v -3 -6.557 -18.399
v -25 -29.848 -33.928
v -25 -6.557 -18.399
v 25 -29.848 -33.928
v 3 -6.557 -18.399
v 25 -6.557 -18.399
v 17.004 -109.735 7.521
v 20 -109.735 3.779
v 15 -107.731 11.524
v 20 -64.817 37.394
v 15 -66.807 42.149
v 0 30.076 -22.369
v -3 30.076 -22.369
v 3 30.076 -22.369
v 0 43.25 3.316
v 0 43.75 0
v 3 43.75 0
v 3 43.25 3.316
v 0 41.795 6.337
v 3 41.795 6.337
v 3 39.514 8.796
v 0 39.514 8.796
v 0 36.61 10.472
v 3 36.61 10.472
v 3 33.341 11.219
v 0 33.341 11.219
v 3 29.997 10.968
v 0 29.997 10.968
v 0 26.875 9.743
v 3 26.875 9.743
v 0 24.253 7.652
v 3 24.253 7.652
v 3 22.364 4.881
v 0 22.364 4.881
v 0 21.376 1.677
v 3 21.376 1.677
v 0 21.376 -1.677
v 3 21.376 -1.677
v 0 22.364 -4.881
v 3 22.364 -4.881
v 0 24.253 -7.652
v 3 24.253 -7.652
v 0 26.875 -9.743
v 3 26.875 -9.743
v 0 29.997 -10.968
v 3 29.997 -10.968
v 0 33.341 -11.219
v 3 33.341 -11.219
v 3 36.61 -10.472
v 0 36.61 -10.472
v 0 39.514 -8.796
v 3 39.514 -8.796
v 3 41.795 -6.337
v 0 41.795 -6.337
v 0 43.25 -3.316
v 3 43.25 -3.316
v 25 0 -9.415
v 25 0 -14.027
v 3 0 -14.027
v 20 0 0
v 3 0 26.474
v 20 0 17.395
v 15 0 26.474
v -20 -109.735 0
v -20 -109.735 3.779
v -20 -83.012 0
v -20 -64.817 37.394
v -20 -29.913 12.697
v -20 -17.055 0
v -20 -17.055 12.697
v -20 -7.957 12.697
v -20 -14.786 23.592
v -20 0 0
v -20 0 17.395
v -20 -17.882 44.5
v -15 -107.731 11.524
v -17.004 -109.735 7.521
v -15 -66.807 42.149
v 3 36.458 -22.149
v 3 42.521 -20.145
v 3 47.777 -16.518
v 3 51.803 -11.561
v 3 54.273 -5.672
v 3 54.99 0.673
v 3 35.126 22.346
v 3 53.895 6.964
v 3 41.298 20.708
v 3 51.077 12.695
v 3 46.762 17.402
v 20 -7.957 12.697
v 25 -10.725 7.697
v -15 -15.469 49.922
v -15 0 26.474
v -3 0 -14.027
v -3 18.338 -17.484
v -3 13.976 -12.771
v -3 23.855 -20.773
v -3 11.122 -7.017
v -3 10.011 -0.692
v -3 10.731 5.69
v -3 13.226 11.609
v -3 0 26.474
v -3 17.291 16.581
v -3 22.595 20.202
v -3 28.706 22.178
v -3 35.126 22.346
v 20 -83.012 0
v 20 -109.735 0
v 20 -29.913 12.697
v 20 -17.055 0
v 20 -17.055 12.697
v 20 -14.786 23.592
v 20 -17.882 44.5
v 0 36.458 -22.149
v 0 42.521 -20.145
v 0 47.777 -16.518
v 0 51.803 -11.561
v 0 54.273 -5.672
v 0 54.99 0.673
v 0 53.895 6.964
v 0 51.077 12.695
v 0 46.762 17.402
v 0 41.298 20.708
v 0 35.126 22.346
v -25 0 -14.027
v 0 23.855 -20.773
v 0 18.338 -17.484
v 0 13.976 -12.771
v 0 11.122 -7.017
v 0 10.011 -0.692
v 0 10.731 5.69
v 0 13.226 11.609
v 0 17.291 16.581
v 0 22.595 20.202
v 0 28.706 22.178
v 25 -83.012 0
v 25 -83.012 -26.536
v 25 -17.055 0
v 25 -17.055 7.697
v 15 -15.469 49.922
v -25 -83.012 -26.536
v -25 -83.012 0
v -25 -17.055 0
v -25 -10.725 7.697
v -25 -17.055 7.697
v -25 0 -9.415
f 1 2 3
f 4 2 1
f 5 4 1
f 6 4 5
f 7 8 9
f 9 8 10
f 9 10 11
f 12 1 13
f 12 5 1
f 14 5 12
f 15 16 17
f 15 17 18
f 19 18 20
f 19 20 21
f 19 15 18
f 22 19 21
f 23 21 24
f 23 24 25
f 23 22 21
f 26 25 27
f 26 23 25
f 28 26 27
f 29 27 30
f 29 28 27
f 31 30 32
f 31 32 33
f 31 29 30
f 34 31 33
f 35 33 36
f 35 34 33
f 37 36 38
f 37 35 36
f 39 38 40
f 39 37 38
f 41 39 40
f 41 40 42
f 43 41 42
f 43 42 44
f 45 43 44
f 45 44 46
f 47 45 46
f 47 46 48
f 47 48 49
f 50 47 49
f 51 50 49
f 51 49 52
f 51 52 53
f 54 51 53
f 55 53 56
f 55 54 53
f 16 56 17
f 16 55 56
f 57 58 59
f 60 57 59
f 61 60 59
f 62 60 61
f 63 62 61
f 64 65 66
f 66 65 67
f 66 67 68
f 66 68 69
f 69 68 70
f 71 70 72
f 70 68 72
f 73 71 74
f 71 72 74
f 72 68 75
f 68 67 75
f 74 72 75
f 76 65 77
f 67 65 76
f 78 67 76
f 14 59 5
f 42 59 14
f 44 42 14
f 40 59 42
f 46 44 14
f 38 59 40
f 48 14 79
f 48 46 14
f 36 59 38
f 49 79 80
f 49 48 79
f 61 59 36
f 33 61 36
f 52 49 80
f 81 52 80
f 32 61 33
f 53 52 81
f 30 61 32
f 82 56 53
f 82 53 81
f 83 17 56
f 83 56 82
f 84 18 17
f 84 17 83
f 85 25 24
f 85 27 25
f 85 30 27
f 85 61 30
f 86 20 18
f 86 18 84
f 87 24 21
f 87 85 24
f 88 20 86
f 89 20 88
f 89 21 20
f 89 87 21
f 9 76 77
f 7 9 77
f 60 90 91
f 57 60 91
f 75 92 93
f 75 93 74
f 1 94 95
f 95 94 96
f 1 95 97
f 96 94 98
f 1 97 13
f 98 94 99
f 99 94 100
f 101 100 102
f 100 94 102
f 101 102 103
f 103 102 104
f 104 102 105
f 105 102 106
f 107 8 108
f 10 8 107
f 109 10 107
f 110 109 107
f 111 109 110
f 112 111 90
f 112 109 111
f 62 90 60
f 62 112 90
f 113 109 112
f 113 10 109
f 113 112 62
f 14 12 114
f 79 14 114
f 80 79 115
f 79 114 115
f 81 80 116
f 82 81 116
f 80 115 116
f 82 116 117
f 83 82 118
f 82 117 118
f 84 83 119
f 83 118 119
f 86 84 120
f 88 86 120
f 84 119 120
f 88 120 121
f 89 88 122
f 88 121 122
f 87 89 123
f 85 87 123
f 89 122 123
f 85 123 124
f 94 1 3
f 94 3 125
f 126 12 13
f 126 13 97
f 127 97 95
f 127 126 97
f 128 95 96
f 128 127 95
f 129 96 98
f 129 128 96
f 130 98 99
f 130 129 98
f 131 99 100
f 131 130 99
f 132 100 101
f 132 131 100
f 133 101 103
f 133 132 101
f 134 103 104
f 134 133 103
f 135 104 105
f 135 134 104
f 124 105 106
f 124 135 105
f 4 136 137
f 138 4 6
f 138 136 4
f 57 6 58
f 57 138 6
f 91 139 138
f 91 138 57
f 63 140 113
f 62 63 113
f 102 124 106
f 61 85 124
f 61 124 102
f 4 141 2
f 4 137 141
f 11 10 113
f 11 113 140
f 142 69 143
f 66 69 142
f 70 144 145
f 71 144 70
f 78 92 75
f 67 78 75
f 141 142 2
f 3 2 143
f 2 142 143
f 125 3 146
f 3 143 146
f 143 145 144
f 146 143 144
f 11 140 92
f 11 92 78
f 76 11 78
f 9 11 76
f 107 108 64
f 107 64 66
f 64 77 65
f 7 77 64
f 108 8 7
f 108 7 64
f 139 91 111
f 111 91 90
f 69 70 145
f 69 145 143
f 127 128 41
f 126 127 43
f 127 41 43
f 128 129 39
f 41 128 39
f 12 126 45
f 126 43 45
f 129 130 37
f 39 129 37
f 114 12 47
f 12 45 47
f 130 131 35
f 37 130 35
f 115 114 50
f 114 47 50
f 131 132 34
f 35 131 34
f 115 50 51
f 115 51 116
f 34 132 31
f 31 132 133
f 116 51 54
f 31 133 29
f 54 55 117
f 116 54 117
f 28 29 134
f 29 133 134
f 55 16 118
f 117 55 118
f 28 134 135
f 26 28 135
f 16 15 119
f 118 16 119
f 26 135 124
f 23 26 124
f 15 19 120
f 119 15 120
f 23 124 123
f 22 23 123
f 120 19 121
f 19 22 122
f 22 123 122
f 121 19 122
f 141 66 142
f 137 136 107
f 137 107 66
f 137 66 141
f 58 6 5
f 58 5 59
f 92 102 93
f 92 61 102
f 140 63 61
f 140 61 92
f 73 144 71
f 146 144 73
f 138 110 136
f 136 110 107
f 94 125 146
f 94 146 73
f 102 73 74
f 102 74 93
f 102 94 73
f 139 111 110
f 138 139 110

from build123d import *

# Parameters (mm, degrees)
F1_DEPTH      = 20
F1_DEPTH_BACK = 20
F2_DEPTH      = 25
F2_DEPTH_BACK = 25
F3_DEPTH      = 3
F3_DEPTH_BACK = 3
F0_R          = 11.25
F4_DEPTH      = 3
F5_T1_DEPTH   = 79.3350946098
F5_T3_DEPTH   = 53.4182341985
F5_T5_DEPTH   = 77.6393497362
F5_T7_DEPTH   = 53.8076131524
F5_T9_DEPTH   = 40.7011174437
F5_T11_DEPTH  = 34.8143073008


# Not quite as in the source:
# - a fillet or chamfer that OpenCascade refuses, or shapes differently, is made with other operations: its cross-section is extruded or revolved along the edge and cut away or added


with BuildPart() as f1:
    # F0 (on Right) → F1 (new body, two sides)
    with BuildSketch(Plane.YZ) as f1_sk:
        Polygon((0, 0), (0, 26.4743264821), (-15.4693145305, 49.9219790902), (-66.8067783117, 42.1494067516), (-109.735481441, 10.023953287), (-109.735481441, 0), (-83.011649549, 0), (-17.0549713075, 0), (-17.0549713075, 12.6967383549), (-7.9574938864, 12.6967383549), align=None)
    extrude(amount=F1_DEPTH)
    extrude(f1_sk.sketch, amount=-F1_DEPTH_BACK)

    # F0 (on Right) → F2 (join, two sides)
    with BuildSketch(Plane.YZ) as f2_sk:
        Polygon((-29.8482906073, -33.9278131723), (-6.5574786317, -18.399150059), (0, -14.0270879492), (0, 0), (-7.9574938864, 12.6967383549), (-17.0549713075, 12.6967383549), (-17.0549713075, 0), (-83.011649549, 0), (-83.011649549, -26.5361145139), align=None)
    extrude(amount=F2_DEPTH)
    extrude(f2_sk.sketch, amount=-F2_DEPTH_BACK)

    # F0 (on Right) → F3 (join, two sides)
    with BuildSketch(Plane.YZ) as f3_sk:
        with BuildLine():
            ThreePointArc((30.0759126991, -22.3690366524), (10.142147556, 2.5251602116), (35.1261815426, 22.346211547))
            Line((35.1261815426, 22.346211547), (0, 26.4743264821))
            Line((0, 26.4743264821), (0, 0))
            Line((0, 0), (0, -14.0270879492))
            Line((0, -14.0270879492), (-6.5574786317, -18.399150059))
            Line((-6.5574786317, -18.399150059), (30.0759126991, -22.3690366524))
        make_face()
    extrude(amount=F3_DEPTH)
    extrude(f3_sk.sketch, amount=-F3_DEPTH_BACK)

    # F0 (on Right) → F4 (join)
    with BuildSketch(Plane.YZ):
        with BuildLine():
            ThreePointArc((30.0759126991, -22.3690366524), (47.5284403005, -16.7450285797), (55, 0))
            ThreePointArc((55, 0), (49.3127791383, 14.9526070518), (35.1261815426, 22.346211547))
            ThreePointArc((35.1261815426, 22.346211547), (10.142147556, 2.5251602116), (30.0759126991, -22.3690366524))
        make_face()
        with Locations((32.5, 0)):
            Circle(F0_R, mode=Mode.SUBTRACT)
    extrude(amount=F4_DEPTH)

    # F5: chamfer of 5 on 11 edges, made by hand

    # F5_s2 → F5_t1 (cut)
    with BuildSketch(Plane(origin=(0, -12.3102659146, -9.2123182381), x_dir=(1, 0, 0), z_dir=(0, -0.8006358159, -0.5991513084))):
        Polygon((20, 68.7736932965), (15, 73.7736932965), (20, 73.7736932965), align=None)
        Polygon((-20, 68.7736932965), (-15, 73.7736932965), (-20, 73.7736932965), align=None)
    extrude(amount=F5_T1_DEPTH, mode=Mode.SUBTRACT)

    # F5_s4 → F5_t3 (cut)
    with BuildSketch(Plane.YZ.offset(-26.7091170992)):
        Polygon((-107.7312379828, 11.5238176028), (-109.735481441, 7.5206385233), (-109.735481441, 10.023953287), align=None)
    extrude(amount=F5_T3_DEPTH, mode=Mode.SUBTRACT)

    # F5_s6 → F5_t5 (cut)
    with BuildSketch(Plane(origin=(0, 4.9797561094, 0.7539428662), x_dir=(1, 0, 0), z_dir=(0, -0.9887321325, -0.1496955918))):
        Polygon((20, 46.675153037), (15, 51.675153037), (20, 51.675153037), align=None)
        Polygon((-15, 51.675153037), (-20, 46.675153037), (-20, 51.675153037), align=None)
    extrude(amount=F5_T5_DEPTH, mode=Mode.SUBTRACT)

    # F5_s8 → F5_t7 (cut)
    with BuildSketch(Plane(origin=(0, -5.0883568573, 7.7126897705), x_dir=(1, 0, 0), z_dir=(0, -0.5506900388, 0.8347098185))):
        Polygon((15, 14.5791478777), (20, 9.5791478777), (20, 14.5791478777), align=None)
        Polygon((-15, 14.5791478777), (-20, 9.5791478777), (-20, 14.5791478777), align=None)
    extrude(amount=F5_T7_DEPTH, mode=Mode.SUBTRACT)

    # F5_s10 → F5_t9 (cut)
    with BuildSketch(Plane(origin=(0, 6.8285367479, -10.8954082369), x_dir=(1, 0, 0), z_dir=(0, -0.5310558712, 0.8473368053))):
        Polygon((20, 0), (25, -5), (25, 0), align=None)
        Polygon((-25, -5), (-20, 0), (-25, 0), align=None)
    extrude(amount=F5_T9_DEPTH, mode=Mode.SUBTRACT)

    # F5_s12 → F5_t11 (cut)
    with BuildSketch(Plane.XZ.offset(-4.9009210535)):
        Polygon((25, 7.6967383549), (20, 12.6967383549), (25, 12.6967383549), align=None)
        Polygon((-25, 7.6967383549), (-20, 12.6967383549), (-25, 12.6967383549), align=None)
    extrude(amount=F5_T11_DEPTH, mode=Mode.SUBTRACT)


solid = f1.part
